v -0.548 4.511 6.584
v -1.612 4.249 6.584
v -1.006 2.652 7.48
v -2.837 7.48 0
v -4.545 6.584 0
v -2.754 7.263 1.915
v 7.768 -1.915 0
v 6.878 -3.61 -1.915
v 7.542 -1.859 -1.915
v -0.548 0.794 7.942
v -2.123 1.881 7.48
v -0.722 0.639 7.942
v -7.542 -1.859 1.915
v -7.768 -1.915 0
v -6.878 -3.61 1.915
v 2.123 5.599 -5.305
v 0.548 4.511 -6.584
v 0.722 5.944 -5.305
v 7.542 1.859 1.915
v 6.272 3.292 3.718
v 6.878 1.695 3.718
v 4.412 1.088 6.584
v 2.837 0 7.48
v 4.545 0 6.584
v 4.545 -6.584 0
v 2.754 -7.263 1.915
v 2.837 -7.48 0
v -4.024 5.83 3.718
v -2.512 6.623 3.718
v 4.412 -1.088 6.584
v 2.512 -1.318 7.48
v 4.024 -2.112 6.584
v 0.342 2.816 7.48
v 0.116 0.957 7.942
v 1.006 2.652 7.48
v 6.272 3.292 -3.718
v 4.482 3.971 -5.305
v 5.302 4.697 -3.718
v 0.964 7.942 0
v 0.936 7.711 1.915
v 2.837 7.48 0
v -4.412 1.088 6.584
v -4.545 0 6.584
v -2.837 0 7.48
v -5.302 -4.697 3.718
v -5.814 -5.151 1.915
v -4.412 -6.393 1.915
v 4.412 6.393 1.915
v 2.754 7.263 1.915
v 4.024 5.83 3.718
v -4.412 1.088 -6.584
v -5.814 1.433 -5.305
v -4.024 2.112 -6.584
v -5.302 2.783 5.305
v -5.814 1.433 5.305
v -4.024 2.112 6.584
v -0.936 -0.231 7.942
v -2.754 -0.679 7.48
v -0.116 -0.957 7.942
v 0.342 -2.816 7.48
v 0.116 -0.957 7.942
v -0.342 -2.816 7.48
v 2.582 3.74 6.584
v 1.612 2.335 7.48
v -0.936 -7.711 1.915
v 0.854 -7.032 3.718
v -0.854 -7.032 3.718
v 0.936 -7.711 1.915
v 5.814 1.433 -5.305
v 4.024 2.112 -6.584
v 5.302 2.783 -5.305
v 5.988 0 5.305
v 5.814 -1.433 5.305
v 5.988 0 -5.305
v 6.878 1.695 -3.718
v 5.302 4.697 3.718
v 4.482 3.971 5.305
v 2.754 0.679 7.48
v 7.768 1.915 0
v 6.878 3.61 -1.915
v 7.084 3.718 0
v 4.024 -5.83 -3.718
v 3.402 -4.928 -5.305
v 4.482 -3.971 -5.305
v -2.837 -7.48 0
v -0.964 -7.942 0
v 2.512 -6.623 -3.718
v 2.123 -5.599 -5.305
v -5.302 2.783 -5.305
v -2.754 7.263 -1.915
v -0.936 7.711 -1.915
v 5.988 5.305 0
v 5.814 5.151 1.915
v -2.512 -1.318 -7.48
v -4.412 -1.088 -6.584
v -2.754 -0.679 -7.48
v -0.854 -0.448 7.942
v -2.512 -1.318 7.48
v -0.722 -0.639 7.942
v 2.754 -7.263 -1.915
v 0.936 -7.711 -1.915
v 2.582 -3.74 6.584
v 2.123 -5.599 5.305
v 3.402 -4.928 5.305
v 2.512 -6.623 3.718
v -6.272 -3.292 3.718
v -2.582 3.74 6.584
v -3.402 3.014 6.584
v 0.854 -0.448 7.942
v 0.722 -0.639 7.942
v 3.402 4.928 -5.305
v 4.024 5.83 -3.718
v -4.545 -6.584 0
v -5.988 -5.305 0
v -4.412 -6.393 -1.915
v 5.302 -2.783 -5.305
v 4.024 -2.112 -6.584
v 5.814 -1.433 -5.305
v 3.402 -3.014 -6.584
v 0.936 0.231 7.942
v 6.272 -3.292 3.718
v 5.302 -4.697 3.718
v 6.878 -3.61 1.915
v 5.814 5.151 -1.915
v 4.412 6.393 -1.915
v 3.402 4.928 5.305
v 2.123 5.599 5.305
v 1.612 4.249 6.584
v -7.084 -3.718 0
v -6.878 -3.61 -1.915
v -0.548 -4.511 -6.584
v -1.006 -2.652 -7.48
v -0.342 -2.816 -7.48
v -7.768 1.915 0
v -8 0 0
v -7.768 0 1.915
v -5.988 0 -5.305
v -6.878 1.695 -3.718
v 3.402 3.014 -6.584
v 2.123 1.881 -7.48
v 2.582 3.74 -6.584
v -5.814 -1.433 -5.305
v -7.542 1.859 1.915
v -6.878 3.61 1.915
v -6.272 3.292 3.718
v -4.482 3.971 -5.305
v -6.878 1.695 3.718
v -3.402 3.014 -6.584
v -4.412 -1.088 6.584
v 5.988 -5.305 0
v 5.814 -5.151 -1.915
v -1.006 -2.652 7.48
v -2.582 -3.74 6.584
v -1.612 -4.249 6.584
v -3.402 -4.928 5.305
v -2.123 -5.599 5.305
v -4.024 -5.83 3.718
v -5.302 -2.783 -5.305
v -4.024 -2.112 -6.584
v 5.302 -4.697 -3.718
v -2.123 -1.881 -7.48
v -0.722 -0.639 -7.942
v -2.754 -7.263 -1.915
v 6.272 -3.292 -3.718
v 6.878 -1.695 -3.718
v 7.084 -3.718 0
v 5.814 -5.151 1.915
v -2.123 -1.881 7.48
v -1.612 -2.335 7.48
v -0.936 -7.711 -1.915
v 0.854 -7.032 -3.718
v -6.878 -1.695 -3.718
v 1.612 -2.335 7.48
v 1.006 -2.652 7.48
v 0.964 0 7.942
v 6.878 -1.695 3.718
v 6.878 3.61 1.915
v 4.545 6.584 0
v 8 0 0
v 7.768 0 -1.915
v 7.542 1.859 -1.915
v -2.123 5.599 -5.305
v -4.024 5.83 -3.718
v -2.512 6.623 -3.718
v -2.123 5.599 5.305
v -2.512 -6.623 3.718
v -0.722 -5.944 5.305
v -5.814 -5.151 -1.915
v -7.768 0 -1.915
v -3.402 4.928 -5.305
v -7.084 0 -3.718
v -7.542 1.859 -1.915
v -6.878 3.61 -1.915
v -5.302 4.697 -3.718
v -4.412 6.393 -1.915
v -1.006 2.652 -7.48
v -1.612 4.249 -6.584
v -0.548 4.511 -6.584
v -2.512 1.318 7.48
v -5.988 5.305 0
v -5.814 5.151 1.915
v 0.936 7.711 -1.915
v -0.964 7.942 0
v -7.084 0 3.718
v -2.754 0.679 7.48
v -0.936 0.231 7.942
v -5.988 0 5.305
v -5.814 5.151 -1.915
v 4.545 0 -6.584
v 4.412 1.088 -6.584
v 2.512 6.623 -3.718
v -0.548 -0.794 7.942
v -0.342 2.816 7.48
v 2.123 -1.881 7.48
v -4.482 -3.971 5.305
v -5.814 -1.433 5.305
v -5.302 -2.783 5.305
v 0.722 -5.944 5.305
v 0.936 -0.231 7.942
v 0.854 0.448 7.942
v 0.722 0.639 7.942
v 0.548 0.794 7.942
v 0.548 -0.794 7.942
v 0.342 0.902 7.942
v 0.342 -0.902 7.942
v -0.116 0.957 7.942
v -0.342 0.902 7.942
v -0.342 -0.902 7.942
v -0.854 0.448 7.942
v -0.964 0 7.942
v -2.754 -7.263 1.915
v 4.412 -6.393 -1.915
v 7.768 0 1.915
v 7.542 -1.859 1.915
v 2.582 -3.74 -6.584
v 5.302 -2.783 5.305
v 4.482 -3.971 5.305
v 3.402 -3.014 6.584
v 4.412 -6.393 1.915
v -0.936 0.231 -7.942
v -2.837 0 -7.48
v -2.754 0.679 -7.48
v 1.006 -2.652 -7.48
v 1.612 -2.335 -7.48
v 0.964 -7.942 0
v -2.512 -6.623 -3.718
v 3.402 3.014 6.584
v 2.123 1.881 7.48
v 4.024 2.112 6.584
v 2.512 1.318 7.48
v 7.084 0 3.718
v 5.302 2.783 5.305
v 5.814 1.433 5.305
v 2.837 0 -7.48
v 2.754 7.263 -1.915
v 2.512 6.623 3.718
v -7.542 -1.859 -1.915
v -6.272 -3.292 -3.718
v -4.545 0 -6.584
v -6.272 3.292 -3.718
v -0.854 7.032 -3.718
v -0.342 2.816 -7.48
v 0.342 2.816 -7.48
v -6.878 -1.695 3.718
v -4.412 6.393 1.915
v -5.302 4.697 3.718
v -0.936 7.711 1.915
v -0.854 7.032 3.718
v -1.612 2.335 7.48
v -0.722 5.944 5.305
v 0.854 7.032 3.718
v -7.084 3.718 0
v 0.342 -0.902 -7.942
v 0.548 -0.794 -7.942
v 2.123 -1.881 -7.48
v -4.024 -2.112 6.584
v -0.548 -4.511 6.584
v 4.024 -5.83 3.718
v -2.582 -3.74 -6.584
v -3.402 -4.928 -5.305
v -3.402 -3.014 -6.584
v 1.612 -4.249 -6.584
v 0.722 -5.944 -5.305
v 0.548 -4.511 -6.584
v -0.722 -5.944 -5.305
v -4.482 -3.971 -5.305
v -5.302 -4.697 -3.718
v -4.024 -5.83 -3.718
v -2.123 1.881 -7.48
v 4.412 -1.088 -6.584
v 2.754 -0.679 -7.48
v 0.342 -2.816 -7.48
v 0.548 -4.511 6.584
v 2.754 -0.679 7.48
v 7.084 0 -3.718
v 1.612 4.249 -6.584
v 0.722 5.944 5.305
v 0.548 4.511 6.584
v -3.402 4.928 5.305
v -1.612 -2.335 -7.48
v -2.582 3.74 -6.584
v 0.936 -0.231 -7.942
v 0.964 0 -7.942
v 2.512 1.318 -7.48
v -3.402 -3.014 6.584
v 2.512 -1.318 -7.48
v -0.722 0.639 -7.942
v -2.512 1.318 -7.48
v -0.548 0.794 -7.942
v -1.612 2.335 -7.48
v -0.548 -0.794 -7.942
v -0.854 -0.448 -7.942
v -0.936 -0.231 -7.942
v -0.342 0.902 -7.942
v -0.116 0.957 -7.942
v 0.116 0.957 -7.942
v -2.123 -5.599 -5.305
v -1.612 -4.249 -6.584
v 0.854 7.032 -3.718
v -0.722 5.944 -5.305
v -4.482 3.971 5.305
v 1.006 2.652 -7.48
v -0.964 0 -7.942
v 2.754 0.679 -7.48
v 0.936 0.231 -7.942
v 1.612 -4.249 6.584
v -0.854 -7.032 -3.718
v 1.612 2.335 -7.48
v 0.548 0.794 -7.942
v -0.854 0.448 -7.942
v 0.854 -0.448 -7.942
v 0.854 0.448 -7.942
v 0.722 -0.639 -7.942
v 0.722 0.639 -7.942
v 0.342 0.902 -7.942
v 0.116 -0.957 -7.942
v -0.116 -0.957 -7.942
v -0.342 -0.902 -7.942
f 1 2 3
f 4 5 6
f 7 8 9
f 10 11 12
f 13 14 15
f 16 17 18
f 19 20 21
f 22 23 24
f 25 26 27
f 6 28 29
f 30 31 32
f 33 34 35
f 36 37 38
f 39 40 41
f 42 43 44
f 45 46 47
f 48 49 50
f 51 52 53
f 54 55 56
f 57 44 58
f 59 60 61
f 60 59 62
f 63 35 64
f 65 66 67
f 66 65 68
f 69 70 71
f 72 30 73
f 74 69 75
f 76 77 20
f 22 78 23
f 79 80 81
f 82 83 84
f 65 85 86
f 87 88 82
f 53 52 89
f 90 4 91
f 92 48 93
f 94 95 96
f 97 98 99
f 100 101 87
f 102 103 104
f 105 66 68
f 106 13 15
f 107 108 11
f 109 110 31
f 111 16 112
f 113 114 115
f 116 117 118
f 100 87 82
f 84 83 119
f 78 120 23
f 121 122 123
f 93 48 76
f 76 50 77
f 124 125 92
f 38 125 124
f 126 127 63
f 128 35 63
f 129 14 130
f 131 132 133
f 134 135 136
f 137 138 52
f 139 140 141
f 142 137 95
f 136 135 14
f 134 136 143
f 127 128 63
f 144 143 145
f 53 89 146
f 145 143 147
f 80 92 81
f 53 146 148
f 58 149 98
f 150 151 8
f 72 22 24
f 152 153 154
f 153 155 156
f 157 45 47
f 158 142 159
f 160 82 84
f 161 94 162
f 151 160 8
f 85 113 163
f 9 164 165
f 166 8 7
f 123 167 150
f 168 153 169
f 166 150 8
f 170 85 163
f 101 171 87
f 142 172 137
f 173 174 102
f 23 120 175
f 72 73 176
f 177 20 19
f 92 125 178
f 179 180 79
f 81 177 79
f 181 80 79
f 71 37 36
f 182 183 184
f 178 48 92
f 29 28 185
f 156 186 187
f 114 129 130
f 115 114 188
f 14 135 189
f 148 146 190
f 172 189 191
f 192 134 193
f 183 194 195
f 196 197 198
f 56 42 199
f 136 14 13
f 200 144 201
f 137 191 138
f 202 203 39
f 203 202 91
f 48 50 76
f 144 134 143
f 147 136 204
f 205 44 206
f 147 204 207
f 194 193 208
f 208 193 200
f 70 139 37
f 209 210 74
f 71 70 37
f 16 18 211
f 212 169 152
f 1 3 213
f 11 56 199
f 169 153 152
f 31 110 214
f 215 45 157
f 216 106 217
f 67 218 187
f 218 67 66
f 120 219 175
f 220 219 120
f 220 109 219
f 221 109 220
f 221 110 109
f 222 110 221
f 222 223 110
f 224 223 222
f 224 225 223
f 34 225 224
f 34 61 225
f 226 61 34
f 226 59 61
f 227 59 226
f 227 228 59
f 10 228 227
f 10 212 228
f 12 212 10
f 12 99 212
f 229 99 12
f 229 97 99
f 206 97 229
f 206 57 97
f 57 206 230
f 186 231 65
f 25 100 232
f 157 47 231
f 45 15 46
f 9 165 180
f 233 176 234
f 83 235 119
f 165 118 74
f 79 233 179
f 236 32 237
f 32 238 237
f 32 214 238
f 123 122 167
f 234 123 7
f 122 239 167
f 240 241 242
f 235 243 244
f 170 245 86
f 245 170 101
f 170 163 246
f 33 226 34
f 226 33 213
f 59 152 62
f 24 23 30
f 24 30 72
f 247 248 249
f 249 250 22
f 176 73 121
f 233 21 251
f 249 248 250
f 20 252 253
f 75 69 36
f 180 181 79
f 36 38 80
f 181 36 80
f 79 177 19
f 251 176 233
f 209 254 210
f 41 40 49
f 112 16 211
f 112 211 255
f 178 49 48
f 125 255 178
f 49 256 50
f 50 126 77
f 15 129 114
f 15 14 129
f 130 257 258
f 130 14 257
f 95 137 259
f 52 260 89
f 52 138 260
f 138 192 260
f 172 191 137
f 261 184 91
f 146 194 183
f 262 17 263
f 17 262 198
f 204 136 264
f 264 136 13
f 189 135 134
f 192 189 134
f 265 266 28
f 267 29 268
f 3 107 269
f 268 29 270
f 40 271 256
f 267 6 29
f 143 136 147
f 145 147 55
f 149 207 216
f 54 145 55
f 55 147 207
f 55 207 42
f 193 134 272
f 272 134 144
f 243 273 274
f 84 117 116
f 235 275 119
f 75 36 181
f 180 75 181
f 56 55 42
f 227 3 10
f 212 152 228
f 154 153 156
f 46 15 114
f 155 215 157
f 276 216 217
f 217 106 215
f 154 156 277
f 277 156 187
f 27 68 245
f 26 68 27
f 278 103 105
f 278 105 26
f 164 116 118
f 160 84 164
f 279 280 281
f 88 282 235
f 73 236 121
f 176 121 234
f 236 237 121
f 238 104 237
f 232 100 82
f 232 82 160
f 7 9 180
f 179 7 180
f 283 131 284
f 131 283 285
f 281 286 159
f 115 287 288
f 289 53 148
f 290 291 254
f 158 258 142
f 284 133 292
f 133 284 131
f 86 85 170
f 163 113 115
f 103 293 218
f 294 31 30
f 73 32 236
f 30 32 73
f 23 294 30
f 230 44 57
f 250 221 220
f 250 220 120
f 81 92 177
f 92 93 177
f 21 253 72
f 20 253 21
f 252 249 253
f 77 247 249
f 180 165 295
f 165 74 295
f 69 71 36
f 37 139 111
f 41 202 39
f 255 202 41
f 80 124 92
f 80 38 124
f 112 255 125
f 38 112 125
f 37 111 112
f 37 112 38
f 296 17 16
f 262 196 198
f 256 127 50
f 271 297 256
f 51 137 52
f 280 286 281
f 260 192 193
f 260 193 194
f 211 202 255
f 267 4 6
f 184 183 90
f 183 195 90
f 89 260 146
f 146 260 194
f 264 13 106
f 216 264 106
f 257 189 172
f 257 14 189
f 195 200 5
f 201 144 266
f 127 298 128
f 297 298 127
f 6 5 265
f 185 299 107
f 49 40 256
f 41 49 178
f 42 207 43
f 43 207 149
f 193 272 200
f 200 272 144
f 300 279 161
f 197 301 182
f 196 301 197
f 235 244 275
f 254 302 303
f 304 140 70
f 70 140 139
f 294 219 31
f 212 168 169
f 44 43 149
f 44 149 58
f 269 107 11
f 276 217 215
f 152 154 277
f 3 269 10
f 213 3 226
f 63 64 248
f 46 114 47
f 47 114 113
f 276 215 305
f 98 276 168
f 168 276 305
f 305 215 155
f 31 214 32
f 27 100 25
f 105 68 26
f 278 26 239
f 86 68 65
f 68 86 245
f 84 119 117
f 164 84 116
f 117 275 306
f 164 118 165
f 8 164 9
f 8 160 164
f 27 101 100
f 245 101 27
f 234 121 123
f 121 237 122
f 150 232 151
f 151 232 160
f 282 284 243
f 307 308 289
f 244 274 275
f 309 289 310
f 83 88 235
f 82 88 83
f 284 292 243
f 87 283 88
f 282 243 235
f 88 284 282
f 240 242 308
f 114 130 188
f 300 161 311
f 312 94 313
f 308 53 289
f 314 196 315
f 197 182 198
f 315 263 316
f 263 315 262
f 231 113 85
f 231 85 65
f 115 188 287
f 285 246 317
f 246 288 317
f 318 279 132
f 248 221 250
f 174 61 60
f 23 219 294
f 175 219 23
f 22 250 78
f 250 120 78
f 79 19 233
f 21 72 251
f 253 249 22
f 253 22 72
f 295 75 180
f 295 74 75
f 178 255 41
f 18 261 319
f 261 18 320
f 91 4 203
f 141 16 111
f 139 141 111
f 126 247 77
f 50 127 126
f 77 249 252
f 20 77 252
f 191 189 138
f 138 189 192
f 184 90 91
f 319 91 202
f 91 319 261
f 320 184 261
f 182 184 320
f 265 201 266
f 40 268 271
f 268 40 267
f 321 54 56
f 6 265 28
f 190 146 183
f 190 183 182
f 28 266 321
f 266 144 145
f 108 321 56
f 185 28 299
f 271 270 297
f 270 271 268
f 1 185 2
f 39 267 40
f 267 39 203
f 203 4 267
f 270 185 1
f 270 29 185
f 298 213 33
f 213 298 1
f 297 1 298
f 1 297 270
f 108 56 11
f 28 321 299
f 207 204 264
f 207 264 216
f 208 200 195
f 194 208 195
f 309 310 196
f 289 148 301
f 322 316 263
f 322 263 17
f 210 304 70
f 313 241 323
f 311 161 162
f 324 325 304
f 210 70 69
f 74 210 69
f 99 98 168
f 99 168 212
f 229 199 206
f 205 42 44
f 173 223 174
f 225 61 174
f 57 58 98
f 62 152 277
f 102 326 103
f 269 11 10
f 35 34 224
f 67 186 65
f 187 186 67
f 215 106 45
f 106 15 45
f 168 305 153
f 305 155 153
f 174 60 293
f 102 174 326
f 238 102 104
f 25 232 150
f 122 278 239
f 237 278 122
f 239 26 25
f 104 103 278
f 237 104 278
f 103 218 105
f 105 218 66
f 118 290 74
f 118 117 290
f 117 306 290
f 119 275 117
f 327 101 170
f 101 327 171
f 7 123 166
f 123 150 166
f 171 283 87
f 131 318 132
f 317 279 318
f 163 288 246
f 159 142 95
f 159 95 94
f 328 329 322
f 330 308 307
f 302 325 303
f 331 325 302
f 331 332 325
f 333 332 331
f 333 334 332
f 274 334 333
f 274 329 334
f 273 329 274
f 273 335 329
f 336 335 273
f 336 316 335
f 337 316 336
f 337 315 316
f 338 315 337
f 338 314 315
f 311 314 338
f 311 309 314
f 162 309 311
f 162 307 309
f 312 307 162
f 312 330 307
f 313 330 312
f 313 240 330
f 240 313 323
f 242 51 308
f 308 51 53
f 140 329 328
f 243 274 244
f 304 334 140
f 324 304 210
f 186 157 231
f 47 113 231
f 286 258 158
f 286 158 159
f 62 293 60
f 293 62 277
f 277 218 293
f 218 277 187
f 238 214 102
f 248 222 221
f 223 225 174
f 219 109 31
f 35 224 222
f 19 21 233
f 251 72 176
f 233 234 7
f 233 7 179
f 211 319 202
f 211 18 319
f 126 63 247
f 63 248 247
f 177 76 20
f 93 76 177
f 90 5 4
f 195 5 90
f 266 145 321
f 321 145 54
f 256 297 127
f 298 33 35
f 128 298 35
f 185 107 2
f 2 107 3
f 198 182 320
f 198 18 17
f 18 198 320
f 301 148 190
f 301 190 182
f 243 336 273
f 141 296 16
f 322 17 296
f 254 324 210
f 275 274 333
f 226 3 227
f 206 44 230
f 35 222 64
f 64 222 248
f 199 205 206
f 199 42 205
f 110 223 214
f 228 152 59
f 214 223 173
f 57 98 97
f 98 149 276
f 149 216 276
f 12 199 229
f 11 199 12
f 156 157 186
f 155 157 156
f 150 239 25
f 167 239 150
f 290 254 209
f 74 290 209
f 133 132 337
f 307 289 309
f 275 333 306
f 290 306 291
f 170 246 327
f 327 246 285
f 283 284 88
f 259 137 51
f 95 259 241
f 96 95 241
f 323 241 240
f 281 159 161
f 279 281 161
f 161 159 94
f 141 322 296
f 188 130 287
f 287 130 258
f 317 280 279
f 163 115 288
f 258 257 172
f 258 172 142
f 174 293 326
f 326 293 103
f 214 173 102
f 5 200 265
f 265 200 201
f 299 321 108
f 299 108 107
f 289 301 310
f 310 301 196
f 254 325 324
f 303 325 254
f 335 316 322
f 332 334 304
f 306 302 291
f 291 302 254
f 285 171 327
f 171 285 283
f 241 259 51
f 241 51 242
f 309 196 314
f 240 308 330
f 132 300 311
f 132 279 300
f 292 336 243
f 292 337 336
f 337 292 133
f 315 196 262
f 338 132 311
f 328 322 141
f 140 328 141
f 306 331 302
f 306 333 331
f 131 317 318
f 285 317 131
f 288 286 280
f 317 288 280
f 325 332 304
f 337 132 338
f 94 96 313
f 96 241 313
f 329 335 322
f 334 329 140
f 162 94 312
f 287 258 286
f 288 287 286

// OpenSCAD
intersection(){
  cube([30, 18, 18], center=true);
  sphere(r=8);
}
